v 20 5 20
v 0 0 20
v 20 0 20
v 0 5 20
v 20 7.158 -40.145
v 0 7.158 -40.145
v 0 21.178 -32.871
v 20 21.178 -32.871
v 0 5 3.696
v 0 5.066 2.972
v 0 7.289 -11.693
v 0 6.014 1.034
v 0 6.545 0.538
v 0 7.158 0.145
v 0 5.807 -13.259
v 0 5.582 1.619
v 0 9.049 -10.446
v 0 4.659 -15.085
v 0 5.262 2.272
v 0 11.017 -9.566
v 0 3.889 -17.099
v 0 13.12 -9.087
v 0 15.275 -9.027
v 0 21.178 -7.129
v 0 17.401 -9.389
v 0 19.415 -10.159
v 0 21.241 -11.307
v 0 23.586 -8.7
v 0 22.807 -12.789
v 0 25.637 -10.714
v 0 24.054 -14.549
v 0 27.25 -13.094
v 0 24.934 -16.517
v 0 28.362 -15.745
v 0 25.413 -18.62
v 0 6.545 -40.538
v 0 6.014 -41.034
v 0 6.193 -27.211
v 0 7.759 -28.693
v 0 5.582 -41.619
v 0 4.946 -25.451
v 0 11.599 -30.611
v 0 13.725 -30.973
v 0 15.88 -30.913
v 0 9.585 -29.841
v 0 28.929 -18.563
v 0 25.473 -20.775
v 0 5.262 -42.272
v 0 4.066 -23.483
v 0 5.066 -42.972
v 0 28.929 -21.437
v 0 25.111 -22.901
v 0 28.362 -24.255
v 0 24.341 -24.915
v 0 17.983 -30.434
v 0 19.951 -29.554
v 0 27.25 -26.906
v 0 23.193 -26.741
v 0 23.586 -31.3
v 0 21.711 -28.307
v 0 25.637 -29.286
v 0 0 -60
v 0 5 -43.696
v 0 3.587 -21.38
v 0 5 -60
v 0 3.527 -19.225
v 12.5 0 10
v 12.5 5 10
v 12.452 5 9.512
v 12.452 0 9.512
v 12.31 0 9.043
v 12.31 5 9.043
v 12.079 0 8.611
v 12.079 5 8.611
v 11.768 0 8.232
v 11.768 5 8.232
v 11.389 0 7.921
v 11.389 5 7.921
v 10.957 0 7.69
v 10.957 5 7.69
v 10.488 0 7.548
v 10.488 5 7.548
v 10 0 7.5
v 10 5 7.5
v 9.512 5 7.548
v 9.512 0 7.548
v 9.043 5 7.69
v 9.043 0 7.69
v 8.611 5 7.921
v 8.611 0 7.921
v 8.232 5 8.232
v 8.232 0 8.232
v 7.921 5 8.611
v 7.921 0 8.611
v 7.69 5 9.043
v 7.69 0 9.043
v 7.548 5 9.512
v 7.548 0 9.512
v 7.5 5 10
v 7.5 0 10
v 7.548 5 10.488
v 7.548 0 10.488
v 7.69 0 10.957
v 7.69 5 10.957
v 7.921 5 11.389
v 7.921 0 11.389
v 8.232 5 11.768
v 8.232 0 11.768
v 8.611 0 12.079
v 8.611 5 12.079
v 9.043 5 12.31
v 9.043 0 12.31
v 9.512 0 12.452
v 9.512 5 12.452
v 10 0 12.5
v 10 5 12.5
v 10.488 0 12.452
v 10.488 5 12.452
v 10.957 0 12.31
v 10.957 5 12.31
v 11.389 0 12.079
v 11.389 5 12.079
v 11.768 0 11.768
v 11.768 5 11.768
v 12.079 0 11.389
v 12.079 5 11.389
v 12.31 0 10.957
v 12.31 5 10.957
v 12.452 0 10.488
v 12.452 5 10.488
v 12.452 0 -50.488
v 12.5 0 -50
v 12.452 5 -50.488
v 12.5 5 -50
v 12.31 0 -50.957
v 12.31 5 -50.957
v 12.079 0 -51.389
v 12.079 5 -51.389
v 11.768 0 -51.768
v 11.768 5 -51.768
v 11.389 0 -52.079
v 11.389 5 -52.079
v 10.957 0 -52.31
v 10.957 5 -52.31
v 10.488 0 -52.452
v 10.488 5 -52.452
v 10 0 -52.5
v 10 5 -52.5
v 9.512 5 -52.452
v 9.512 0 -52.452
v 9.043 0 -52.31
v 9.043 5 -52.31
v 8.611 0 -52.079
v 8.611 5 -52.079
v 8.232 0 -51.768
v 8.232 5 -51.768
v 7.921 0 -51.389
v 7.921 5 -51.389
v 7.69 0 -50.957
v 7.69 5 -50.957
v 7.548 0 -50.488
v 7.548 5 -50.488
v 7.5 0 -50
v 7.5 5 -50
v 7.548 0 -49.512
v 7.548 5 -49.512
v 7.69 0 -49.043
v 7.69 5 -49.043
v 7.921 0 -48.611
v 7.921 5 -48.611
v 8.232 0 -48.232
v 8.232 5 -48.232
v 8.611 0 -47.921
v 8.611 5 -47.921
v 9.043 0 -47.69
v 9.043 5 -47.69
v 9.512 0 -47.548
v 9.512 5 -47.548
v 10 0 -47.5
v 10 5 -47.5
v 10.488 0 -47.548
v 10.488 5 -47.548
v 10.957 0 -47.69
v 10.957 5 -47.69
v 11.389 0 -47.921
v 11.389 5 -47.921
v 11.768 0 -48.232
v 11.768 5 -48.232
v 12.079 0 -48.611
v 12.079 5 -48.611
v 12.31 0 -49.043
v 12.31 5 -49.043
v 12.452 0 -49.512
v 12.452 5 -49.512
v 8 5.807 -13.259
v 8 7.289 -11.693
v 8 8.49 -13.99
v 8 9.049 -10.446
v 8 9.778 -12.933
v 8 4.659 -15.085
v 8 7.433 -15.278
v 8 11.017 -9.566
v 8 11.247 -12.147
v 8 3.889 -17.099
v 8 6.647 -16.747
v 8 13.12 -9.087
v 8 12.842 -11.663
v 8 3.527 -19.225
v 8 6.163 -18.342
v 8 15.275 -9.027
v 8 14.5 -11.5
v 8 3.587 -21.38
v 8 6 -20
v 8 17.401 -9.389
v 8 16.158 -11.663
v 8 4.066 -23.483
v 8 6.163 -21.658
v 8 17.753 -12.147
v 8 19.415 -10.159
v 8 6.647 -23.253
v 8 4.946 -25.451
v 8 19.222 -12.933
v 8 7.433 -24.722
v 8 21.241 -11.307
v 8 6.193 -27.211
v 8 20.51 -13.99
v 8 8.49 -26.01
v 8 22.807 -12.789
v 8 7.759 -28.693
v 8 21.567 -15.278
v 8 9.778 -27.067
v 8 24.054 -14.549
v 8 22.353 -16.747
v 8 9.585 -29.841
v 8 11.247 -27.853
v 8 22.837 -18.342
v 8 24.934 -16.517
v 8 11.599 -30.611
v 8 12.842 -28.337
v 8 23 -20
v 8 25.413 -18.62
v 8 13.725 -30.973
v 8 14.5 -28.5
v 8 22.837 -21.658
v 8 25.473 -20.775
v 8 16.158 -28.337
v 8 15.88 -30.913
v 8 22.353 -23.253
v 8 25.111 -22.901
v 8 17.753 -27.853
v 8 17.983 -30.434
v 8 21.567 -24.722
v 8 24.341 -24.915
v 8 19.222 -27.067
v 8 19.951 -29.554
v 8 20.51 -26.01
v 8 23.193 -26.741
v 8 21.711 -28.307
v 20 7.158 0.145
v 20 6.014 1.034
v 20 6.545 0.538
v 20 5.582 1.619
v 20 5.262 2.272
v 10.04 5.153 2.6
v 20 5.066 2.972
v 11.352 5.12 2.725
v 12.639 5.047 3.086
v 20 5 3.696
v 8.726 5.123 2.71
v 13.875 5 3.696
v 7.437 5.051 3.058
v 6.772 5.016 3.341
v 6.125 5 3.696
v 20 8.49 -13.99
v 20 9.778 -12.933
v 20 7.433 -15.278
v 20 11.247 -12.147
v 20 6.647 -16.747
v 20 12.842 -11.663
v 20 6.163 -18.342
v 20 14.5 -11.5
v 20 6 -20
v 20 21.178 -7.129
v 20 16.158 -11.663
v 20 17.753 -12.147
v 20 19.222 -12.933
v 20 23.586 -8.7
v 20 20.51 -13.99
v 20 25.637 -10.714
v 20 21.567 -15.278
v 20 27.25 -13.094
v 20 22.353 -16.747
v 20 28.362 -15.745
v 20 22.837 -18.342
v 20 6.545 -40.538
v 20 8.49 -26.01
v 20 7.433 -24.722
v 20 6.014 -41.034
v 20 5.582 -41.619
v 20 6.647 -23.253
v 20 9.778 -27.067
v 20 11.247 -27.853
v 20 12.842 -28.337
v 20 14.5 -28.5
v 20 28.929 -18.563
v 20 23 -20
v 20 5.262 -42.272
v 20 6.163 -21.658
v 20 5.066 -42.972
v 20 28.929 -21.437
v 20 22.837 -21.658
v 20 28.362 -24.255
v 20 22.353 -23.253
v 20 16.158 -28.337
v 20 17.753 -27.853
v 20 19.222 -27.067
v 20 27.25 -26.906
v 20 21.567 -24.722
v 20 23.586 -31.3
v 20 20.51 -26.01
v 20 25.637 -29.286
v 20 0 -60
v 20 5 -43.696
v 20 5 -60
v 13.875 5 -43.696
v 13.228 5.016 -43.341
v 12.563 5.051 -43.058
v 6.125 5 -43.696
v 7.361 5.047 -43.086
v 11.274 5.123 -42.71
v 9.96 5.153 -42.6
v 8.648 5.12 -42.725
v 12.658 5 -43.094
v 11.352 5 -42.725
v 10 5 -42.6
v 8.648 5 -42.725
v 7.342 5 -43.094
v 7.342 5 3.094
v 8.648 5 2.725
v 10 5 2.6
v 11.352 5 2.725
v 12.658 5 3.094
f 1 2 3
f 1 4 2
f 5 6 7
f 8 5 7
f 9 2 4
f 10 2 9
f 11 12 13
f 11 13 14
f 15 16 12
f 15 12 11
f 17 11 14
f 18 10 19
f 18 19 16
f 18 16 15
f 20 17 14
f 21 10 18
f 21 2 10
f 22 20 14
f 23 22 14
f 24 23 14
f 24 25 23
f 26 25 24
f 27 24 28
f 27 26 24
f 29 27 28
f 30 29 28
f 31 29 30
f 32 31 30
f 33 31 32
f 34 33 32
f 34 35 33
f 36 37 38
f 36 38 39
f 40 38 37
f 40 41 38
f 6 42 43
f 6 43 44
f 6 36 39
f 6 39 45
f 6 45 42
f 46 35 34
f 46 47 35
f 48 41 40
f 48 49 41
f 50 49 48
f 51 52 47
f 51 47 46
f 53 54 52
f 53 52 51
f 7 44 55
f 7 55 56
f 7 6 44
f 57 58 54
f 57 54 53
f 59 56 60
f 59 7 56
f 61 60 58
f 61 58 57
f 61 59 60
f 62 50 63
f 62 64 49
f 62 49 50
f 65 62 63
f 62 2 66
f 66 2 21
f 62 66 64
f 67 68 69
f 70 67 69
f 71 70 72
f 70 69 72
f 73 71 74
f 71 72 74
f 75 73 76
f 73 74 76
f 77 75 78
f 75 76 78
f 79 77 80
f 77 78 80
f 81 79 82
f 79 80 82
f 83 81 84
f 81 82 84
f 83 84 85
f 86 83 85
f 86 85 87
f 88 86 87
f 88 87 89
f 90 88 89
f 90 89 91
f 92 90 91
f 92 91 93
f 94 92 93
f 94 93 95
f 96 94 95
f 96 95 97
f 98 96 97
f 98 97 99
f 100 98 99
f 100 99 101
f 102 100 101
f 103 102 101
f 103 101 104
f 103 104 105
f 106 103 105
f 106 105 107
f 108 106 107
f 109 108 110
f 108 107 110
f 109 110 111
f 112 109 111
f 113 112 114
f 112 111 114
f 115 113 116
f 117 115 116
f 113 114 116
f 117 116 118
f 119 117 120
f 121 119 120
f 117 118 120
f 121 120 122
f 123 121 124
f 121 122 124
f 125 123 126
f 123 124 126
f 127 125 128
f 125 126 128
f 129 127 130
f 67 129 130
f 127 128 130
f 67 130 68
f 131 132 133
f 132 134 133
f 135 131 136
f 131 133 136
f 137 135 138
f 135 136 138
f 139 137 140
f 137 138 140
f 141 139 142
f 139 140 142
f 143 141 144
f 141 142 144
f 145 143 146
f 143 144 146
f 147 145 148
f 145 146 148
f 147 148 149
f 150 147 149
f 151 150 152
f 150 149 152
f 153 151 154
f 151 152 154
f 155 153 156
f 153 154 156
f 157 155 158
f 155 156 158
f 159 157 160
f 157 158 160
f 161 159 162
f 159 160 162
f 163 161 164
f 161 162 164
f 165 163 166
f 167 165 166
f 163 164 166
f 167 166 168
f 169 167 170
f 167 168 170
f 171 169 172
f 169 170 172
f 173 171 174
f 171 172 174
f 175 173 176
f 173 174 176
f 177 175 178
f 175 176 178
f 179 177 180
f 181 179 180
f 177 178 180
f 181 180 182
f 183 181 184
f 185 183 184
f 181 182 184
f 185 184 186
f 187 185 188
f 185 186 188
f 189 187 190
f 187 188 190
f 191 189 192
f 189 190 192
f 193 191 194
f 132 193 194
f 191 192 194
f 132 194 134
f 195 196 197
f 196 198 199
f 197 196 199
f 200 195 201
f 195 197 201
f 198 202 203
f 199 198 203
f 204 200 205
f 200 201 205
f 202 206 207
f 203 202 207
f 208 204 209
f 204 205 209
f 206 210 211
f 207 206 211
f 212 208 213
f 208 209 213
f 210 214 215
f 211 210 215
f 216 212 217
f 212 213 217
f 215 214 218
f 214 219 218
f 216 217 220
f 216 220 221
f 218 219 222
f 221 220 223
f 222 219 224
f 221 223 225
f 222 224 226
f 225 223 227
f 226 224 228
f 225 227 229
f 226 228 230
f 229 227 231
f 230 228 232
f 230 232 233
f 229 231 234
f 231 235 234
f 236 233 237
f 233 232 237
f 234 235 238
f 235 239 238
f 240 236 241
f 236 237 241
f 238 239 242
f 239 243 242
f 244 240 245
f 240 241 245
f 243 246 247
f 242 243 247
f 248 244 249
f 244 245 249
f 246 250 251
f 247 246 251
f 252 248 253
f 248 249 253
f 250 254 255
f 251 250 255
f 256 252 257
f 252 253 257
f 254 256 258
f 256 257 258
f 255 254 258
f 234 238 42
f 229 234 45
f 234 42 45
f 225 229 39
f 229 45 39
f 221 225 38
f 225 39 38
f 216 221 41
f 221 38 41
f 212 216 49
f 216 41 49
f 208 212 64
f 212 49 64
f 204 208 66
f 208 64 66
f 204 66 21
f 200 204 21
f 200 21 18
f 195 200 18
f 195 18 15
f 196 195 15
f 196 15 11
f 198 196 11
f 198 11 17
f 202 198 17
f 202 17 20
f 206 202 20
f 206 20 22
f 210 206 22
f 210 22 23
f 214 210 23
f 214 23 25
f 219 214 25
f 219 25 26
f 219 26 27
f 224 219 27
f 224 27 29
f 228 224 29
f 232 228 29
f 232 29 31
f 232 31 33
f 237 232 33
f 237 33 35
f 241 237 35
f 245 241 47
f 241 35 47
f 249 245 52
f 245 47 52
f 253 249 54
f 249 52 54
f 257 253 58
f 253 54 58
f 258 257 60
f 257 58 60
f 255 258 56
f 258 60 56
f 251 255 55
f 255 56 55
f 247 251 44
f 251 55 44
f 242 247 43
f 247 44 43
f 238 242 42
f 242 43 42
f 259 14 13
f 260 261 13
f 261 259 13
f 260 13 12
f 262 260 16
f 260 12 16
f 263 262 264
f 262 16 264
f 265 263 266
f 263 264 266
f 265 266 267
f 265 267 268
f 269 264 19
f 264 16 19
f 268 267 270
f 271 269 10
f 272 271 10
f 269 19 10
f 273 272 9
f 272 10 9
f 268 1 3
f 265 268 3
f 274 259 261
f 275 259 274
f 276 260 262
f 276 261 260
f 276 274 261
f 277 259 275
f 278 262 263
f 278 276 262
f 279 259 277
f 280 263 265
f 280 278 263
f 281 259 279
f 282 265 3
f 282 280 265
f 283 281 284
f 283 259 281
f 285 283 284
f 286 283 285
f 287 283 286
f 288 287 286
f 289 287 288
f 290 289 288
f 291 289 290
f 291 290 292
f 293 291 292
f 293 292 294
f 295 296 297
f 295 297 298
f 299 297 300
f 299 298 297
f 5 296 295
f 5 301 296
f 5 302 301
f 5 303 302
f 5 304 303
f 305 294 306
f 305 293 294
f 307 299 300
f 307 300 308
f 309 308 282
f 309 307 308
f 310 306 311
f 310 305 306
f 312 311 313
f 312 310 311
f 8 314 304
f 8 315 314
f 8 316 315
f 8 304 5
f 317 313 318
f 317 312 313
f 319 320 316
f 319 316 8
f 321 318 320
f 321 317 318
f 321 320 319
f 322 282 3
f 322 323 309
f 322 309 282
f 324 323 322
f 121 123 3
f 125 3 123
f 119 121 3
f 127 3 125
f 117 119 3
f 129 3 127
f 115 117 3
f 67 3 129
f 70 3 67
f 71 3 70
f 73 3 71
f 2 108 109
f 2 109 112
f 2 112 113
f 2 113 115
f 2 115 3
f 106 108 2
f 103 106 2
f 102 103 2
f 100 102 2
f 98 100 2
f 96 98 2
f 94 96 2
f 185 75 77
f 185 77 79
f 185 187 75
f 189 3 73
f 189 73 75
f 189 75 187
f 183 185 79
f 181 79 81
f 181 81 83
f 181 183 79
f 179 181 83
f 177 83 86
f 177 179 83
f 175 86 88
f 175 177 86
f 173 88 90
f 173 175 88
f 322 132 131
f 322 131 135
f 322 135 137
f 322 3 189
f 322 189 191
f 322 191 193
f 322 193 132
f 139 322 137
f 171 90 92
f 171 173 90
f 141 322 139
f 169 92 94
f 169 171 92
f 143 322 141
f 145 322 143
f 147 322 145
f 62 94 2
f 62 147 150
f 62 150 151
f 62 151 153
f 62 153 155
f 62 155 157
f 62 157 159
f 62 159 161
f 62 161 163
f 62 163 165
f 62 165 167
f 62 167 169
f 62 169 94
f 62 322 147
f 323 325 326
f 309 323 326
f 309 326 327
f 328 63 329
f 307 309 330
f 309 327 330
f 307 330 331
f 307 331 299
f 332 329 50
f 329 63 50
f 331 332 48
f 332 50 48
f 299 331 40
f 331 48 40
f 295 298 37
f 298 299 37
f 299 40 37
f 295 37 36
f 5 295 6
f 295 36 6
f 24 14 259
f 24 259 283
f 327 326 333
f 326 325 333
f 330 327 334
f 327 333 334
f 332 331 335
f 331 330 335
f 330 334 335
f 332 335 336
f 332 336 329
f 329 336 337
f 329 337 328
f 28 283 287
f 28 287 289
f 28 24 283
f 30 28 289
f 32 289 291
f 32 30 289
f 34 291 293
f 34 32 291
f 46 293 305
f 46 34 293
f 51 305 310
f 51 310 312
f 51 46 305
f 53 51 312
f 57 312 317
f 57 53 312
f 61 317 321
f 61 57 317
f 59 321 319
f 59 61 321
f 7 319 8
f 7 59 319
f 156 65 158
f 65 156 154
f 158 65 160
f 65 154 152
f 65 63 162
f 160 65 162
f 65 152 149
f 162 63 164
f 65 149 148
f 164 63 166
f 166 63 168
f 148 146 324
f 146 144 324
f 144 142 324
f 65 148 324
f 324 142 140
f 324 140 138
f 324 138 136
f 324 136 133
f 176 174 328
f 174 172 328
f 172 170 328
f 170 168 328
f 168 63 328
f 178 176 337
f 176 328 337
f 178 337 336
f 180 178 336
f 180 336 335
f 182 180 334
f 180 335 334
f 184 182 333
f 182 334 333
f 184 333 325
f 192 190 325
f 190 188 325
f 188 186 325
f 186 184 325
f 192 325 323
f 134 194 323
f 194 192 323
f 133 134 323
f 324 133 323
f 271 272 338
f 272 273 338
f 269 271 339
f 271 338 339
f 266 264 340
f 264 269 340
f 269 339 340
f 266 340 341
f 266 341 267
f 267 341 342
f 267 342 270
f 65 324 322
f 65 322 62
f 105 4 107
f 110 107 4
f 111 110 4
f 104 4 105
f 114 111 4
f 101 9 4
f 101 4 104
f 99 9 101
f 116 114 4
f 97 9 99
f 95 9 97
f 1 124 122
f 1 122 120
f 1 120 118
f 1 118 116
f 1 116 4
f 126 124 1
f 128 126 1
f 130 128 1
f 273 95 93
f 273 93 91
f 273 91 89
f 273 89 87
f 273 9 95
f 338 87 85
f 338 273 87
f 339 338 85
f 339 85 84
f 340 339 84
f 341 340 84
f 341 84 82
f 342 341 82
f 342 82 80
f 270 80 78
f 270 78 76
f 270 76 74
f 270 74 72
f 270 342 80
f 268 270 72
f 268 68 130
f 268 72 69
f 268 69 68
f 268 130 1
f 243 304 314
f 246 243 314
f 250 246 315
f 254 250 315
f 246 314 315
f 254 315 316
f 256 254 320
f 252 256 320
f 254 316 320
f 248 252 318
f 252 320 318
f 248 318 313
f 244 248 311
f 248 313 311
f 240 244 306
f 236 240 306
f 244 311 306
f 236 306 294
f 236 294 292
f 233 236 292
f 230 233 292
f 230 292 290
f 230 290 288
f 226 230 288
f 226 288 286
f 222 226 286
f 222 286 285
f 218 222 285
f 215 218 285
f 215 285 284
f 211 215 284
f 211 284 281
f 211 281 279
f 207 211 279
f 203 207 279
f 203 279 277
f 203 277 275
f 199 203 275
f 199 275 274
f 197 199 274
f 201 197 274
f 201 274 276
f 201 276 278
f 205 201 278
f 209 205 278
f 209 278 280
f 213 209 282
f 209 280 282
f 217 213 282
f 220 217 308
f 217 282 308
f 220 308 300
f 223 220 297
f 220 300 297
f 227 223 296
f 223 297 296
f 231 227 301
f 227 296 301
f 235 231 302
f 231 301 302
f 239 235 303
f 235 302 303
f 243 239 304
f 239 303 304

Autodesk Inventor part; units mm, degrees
ref_plane "YZ Plane" through (0, 0, 0) normal (1, 0, 0) x (0, 1, 0)
ref_plane "XZ Plane" through (0, 0, 0) normal (0, 1, 0) x (-1, 0, 0)
ref_plane "XY Plane" through (0, 0, 0) normal (0, 0, 1) x (1, 0, 0)
sketch "Sketch1" plane through (0, 0, 0) normal (1, 0, 0) x (0, 1, 0)
  line L0 (0, 0) -> (5, 0)
  line L1 (5, 0) -> (5, -40)
  line L2 (5, -40) -> (0, -40)
  line L3 (0, -40) -> (0, 0)
  line L4 (5, -20) -> (10.5, -20)
  circle A0 centre (10.5, -20) radius 4
  line L5 (10.5, -16) -> (5, -16)
  line L6 (10.5, -24) -> (5, -24)
  circle A1 centre (10.5, -20) radius 5.5
  line L7 (14.277, -16.0019) -> (5, -7.2379)
  line L8 (14.2701, -24.0045) -> (5, -32.7321)
  dimension "d0" = 5
  dimension "d1" = 40
  dimension "d2" = 5.5
  dimension "d3" = 8
extrude "Extrusion1" add sketch "Sketch1" along normal blind 20 contours L0 L1 L2 L3 | L7 A1 L5 L1 | L5 A1 L1 | A1 L6 A0 L5 | L1 L6 A1 L8 | A1 L6 L1 | A1 L5 A0 L4 | L4 A0 L6 A1
sketch "Sketch2" plane through (0, 0, -40) normal (0, 0, -1) x (-1, 0, 0)
  line L0 (0, 5) -> (-20, 5) projected
  line L1 (-20, 5) -> (0, 5)
  line L2 (0, 5) -> (0, 0)
  line L3 (0, 0) -> (-20, 0)
  line L4 (-20, 0) -> (-20, 5)
extrude "Extrusion2" add sketch "Sketch2" along normal blind 20
sketch "Sketch3" plane through (0, 0, 0) normal (0, 0, 1) x (1, 0, 0)
  line L0 (0, 5) -> (20, 5) projected
  line L1 (20, 5) -> (20, 0) projected
  line L2 (0, 5) -> (20, 5)
  line L3 (20, 5) -> (20, 0)
  line L4 (20, 0) -> (0, 0)
  line L5 (0, 0) -> (0, 5)
extrude "Extrusion3" add sketch "Sketch3" along normal blind 20
fillet "Fillet1" radius 4 2 edges at (10, 5, -32.7321) (10, 5, -7.2379)
sketch "Sketch4" plane through (0, 5, 20) normal (0, 1, 0) x (1, 0, 0)
  line L0 (0, 80) -> (0, 0) projected
  line L1 (0, 0) -> (10, 0)
  line L2 (0, 0) -> (20, 0) projected
  line L3 (10, 0) -> (10, 10)
  circle A0 centre (10, 10) radius 2.5
  line L4 (0, 80) -> (10, 80)
  line L5 (0, 80) -> (20, 80) projected
  line L6 (10, 80) -> (10, 70)
  circle A1 centre (10, 70) radius 2.5
  point P0 (0, 20)
  dimension "d11" = 10
  dimension "d12" = 10
  dimension "d13" = 5
  dimension "d14" = 10
  dimension "d15" = 5
extrude "Extrusion4" cut sketch "Sketch4" against normal blind 20
sketch "Sketch5" plane through (20, 0, 0) normal (1, 0, 0) x (0, 0, -1)
  circle A0 centre (20, 10.5) radius 4 projected
  circle A1 centre (20, 10.5) radius 7
  line L0 (16, 16.2446) -> (0, 5)
  line L1 (5.5141, 5) -> (-20, 5) projected
  line L2 (34.46, 5) -> (60, 5) projected
  line L3 (20, 17.5) -> (20, 10.5)
  line L4 (24, 16.2446) -> (40, 5)
  line L5 (40, 5) -> (24.3301, 5)
  line L6 (0, 5) -> (15.6699, 5)
  point P0 (0, 0)
  point P1 (40, 5)
  dimension "d18" = 14
extrude "Extrusion5" add sketch "Sketch5" against normal blind 20
fillet "Fillet2" radius 4 2 edges at (10, 5, -40) (10, 5, 0)
sketch "Sketch6" plane through (0, 0, 0) normal (-1, 0, 0) x (0, 0, 1)
  circle A0 centre (-20, 10.5) radius 4 projected
  line L0 (-20, 10.5) -> (-20, 14.5)
  circle A1 centre (-20, 14.5) radius 11
  circle A2 centre (-20, 14.5) radius 14.5
  arc A3 (-41.265, 5) -> (-38.965, 5.7274) centre (-41.265, 9) ccw projected
  line L1 (-41.265, 5) -> (-32.8706, 21.1782)
  line L2 (1.265, 5) -> (20, 5) projected
  line L3 (1.265, 5) -> (-7.1294, 21.1782)
  line L4 (-41.265, 5) -> (-23.6138, 0.4575)
  arc A4 (-1.035, 5.7274) -> (1.265, 5) centre (1.265, 9) ccw projected
  line L5 (-16.3862, 0.4575) -> (1.265, 5)
  point P0 (0, 0)
  dimension "d23" = 4
  dimension "d24" = 22
extrude "Extrusion6" add sketch "Sketch6" against normal blind 20 contours A2 | A2 L3 L5 | A2 L4 L1
sketch "Sketch7" plane through (0, 0, 0) normal (-1, 0, 0) x (0, 0, 1)
  circle A0 centre (-20, 10.5) radius 4 projected
  circle A1 centre (-20, 14.5) radius 11
  point P0 (0, 0)
extrude "Extrusion7" cut sketch "Sketch7" against normal blind 20
fillet "Fillet3" radius 4 2 edges at (10, 5, -41.265) (10, 5, 1.265)
sketch "Sketch8" plane through (0, 5, 20) normal (0, 1, 0) x (1, 0, 0)
  circle A0 centre (10, 10) radius 2.5 projected
  circle A1 centre (10, 10) radius 7.4
  circle A2 centre (10, 70) radius 2.5 projected
  circle A3 centre (10, 70) radius 7.4
  point P0 (0, 20)
  dimension "d30" = 14.8
  dimension "d31" = 14.8
extrude "Extrusion8" cut sketch "Sketch8" along normal blind 10
sketch "Sketch9" plane through (20, 0, 0) normal (1, 0, 0) x (0, 0, -1)
  circle A0 centre (20, 14.5) radius 11 projected
  circle A1 centre (20, 14.5) radius 11
  circle A2 centre (20, 14.5) radius 8.5
  point P0 (0, 0)
  dimension "d34" = 17
extrude "Extrusion9" add sketch "Sketch9" against normal blind 12
properties part number "base_axis_8mm_2020" material "PET Plastic"
